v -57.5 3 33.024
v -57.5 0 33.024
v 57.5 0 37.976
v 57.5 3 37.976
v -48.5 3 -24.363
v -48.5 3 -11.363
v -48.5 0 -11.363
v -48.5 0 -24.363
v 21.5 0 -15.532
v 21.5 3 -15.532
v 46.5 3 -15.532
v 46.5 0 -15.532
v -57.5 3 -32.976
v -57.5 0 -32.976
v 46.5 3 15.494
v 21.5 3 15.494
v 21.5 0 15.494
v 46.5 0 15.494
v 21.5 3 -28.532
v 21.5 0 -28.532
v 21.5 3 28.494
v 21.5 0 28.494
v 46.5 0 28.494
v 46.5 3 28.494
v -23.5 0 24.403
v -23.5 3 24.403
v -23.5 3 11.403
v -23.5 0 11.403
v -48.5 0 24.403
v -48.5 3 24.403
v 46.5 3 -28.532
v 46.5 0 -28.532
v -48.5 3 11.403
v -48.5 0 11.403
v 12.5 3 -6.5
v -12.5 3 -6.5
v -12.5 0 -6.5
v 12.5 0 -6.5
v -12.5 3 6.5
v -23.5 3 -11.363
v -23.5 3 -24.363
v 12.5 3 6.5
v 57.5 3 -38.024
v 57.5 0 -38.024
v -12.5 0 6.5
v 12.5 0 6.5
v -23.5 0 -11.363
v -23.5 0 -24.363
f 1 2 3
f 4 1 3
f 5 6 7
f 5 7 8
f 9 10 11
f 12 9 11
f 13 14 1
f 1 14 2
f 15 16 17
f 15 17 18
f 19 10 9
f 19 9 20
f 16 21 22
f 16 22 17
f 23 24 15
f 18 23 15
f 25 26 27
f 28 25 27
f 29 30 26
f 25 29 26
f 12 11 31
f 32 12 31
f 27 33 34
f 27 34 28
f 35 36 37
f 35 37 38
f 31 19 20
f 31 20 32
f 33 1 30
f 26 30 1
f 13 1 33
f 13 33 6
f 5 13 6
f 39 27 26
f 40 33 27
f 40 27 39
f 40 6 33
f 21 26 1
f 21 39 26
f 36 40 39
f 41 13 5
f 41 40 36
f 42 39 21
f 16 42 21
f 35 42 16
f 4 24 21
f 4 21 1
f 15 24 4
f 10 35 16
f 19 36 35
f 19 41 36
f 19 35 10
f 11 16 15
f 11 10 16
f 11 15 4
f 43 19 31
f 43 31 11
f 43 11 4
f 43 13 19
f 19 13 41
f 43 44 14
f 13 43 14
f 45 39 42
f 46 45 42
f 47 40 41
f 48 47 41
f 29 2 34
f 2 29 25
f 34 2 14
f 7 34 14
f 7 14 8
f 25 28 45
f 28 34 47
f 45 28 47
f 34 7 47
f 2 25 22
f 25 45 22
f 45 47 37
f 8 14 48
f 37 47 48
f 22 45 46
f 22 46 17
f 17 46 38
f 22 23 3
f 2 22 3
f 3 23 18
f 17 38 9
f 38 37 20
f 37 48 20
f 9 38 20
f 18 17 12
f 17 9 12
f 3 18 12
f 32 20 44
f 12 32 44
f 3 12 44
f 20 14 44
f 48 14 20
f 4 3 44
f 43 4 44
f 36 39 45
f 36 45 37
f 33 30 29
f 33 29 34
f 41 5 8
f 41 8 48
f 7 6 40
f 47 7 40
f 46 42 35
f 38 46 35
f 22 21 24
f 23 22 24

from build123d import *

# Parameters (mm, degrees)
BOSS_EXTRUDE1_DEPTH = 3
SKETCH2_W           = 25
SKETCH2_H           = 13
CUT_EXTRUDE1_DEPTH  = 3


with BuildPart() as part:
    # Sketch1 → Boss-Extrude1 (new body)
    with BuildSketch(Plane(origin=(0, 0, 0), x_dir=(1, 0, 0), z_dir=(0, 1, 0))):
        Polygon((-57.5, -33.023654191), (57.5, -37.976345809), (57.5, 38.023654191), (-57.5, 32.976345809), align=None)
    extrude(amount=BOSS_EXTRUDE1_DEPTH)

    # Sketch2 → Cut-Extrude1 (cut)
    with BuildSketch(Plane(origin=(0, 3, 0), x_dir=(1, 0, 0), z_dir=(0, 1, 0))):
        with Locations((34, -21.994267552)):
            Rectangle(SKETCH2_W, SKETCH2_H)
        Rectangle(SKETCH2_W, SKETCH2_H)
        with Locations((-36, -17.902913606)):
            Rectangle(SKETCH2_W, SKETCH2_H)
        with Locations((-36, 17.862688371)):
            Rectangle(SKETCH2_W, SKETCH2_H)
        with Locations((34, 22.032203991)):
            Rectangle(SKETCH2_W, SKETCH2_H)
    extrude(amount=-CUT_EXTRUDE1_DEPTH, mode=Mode.SUBTRACT)


solid = part.part
